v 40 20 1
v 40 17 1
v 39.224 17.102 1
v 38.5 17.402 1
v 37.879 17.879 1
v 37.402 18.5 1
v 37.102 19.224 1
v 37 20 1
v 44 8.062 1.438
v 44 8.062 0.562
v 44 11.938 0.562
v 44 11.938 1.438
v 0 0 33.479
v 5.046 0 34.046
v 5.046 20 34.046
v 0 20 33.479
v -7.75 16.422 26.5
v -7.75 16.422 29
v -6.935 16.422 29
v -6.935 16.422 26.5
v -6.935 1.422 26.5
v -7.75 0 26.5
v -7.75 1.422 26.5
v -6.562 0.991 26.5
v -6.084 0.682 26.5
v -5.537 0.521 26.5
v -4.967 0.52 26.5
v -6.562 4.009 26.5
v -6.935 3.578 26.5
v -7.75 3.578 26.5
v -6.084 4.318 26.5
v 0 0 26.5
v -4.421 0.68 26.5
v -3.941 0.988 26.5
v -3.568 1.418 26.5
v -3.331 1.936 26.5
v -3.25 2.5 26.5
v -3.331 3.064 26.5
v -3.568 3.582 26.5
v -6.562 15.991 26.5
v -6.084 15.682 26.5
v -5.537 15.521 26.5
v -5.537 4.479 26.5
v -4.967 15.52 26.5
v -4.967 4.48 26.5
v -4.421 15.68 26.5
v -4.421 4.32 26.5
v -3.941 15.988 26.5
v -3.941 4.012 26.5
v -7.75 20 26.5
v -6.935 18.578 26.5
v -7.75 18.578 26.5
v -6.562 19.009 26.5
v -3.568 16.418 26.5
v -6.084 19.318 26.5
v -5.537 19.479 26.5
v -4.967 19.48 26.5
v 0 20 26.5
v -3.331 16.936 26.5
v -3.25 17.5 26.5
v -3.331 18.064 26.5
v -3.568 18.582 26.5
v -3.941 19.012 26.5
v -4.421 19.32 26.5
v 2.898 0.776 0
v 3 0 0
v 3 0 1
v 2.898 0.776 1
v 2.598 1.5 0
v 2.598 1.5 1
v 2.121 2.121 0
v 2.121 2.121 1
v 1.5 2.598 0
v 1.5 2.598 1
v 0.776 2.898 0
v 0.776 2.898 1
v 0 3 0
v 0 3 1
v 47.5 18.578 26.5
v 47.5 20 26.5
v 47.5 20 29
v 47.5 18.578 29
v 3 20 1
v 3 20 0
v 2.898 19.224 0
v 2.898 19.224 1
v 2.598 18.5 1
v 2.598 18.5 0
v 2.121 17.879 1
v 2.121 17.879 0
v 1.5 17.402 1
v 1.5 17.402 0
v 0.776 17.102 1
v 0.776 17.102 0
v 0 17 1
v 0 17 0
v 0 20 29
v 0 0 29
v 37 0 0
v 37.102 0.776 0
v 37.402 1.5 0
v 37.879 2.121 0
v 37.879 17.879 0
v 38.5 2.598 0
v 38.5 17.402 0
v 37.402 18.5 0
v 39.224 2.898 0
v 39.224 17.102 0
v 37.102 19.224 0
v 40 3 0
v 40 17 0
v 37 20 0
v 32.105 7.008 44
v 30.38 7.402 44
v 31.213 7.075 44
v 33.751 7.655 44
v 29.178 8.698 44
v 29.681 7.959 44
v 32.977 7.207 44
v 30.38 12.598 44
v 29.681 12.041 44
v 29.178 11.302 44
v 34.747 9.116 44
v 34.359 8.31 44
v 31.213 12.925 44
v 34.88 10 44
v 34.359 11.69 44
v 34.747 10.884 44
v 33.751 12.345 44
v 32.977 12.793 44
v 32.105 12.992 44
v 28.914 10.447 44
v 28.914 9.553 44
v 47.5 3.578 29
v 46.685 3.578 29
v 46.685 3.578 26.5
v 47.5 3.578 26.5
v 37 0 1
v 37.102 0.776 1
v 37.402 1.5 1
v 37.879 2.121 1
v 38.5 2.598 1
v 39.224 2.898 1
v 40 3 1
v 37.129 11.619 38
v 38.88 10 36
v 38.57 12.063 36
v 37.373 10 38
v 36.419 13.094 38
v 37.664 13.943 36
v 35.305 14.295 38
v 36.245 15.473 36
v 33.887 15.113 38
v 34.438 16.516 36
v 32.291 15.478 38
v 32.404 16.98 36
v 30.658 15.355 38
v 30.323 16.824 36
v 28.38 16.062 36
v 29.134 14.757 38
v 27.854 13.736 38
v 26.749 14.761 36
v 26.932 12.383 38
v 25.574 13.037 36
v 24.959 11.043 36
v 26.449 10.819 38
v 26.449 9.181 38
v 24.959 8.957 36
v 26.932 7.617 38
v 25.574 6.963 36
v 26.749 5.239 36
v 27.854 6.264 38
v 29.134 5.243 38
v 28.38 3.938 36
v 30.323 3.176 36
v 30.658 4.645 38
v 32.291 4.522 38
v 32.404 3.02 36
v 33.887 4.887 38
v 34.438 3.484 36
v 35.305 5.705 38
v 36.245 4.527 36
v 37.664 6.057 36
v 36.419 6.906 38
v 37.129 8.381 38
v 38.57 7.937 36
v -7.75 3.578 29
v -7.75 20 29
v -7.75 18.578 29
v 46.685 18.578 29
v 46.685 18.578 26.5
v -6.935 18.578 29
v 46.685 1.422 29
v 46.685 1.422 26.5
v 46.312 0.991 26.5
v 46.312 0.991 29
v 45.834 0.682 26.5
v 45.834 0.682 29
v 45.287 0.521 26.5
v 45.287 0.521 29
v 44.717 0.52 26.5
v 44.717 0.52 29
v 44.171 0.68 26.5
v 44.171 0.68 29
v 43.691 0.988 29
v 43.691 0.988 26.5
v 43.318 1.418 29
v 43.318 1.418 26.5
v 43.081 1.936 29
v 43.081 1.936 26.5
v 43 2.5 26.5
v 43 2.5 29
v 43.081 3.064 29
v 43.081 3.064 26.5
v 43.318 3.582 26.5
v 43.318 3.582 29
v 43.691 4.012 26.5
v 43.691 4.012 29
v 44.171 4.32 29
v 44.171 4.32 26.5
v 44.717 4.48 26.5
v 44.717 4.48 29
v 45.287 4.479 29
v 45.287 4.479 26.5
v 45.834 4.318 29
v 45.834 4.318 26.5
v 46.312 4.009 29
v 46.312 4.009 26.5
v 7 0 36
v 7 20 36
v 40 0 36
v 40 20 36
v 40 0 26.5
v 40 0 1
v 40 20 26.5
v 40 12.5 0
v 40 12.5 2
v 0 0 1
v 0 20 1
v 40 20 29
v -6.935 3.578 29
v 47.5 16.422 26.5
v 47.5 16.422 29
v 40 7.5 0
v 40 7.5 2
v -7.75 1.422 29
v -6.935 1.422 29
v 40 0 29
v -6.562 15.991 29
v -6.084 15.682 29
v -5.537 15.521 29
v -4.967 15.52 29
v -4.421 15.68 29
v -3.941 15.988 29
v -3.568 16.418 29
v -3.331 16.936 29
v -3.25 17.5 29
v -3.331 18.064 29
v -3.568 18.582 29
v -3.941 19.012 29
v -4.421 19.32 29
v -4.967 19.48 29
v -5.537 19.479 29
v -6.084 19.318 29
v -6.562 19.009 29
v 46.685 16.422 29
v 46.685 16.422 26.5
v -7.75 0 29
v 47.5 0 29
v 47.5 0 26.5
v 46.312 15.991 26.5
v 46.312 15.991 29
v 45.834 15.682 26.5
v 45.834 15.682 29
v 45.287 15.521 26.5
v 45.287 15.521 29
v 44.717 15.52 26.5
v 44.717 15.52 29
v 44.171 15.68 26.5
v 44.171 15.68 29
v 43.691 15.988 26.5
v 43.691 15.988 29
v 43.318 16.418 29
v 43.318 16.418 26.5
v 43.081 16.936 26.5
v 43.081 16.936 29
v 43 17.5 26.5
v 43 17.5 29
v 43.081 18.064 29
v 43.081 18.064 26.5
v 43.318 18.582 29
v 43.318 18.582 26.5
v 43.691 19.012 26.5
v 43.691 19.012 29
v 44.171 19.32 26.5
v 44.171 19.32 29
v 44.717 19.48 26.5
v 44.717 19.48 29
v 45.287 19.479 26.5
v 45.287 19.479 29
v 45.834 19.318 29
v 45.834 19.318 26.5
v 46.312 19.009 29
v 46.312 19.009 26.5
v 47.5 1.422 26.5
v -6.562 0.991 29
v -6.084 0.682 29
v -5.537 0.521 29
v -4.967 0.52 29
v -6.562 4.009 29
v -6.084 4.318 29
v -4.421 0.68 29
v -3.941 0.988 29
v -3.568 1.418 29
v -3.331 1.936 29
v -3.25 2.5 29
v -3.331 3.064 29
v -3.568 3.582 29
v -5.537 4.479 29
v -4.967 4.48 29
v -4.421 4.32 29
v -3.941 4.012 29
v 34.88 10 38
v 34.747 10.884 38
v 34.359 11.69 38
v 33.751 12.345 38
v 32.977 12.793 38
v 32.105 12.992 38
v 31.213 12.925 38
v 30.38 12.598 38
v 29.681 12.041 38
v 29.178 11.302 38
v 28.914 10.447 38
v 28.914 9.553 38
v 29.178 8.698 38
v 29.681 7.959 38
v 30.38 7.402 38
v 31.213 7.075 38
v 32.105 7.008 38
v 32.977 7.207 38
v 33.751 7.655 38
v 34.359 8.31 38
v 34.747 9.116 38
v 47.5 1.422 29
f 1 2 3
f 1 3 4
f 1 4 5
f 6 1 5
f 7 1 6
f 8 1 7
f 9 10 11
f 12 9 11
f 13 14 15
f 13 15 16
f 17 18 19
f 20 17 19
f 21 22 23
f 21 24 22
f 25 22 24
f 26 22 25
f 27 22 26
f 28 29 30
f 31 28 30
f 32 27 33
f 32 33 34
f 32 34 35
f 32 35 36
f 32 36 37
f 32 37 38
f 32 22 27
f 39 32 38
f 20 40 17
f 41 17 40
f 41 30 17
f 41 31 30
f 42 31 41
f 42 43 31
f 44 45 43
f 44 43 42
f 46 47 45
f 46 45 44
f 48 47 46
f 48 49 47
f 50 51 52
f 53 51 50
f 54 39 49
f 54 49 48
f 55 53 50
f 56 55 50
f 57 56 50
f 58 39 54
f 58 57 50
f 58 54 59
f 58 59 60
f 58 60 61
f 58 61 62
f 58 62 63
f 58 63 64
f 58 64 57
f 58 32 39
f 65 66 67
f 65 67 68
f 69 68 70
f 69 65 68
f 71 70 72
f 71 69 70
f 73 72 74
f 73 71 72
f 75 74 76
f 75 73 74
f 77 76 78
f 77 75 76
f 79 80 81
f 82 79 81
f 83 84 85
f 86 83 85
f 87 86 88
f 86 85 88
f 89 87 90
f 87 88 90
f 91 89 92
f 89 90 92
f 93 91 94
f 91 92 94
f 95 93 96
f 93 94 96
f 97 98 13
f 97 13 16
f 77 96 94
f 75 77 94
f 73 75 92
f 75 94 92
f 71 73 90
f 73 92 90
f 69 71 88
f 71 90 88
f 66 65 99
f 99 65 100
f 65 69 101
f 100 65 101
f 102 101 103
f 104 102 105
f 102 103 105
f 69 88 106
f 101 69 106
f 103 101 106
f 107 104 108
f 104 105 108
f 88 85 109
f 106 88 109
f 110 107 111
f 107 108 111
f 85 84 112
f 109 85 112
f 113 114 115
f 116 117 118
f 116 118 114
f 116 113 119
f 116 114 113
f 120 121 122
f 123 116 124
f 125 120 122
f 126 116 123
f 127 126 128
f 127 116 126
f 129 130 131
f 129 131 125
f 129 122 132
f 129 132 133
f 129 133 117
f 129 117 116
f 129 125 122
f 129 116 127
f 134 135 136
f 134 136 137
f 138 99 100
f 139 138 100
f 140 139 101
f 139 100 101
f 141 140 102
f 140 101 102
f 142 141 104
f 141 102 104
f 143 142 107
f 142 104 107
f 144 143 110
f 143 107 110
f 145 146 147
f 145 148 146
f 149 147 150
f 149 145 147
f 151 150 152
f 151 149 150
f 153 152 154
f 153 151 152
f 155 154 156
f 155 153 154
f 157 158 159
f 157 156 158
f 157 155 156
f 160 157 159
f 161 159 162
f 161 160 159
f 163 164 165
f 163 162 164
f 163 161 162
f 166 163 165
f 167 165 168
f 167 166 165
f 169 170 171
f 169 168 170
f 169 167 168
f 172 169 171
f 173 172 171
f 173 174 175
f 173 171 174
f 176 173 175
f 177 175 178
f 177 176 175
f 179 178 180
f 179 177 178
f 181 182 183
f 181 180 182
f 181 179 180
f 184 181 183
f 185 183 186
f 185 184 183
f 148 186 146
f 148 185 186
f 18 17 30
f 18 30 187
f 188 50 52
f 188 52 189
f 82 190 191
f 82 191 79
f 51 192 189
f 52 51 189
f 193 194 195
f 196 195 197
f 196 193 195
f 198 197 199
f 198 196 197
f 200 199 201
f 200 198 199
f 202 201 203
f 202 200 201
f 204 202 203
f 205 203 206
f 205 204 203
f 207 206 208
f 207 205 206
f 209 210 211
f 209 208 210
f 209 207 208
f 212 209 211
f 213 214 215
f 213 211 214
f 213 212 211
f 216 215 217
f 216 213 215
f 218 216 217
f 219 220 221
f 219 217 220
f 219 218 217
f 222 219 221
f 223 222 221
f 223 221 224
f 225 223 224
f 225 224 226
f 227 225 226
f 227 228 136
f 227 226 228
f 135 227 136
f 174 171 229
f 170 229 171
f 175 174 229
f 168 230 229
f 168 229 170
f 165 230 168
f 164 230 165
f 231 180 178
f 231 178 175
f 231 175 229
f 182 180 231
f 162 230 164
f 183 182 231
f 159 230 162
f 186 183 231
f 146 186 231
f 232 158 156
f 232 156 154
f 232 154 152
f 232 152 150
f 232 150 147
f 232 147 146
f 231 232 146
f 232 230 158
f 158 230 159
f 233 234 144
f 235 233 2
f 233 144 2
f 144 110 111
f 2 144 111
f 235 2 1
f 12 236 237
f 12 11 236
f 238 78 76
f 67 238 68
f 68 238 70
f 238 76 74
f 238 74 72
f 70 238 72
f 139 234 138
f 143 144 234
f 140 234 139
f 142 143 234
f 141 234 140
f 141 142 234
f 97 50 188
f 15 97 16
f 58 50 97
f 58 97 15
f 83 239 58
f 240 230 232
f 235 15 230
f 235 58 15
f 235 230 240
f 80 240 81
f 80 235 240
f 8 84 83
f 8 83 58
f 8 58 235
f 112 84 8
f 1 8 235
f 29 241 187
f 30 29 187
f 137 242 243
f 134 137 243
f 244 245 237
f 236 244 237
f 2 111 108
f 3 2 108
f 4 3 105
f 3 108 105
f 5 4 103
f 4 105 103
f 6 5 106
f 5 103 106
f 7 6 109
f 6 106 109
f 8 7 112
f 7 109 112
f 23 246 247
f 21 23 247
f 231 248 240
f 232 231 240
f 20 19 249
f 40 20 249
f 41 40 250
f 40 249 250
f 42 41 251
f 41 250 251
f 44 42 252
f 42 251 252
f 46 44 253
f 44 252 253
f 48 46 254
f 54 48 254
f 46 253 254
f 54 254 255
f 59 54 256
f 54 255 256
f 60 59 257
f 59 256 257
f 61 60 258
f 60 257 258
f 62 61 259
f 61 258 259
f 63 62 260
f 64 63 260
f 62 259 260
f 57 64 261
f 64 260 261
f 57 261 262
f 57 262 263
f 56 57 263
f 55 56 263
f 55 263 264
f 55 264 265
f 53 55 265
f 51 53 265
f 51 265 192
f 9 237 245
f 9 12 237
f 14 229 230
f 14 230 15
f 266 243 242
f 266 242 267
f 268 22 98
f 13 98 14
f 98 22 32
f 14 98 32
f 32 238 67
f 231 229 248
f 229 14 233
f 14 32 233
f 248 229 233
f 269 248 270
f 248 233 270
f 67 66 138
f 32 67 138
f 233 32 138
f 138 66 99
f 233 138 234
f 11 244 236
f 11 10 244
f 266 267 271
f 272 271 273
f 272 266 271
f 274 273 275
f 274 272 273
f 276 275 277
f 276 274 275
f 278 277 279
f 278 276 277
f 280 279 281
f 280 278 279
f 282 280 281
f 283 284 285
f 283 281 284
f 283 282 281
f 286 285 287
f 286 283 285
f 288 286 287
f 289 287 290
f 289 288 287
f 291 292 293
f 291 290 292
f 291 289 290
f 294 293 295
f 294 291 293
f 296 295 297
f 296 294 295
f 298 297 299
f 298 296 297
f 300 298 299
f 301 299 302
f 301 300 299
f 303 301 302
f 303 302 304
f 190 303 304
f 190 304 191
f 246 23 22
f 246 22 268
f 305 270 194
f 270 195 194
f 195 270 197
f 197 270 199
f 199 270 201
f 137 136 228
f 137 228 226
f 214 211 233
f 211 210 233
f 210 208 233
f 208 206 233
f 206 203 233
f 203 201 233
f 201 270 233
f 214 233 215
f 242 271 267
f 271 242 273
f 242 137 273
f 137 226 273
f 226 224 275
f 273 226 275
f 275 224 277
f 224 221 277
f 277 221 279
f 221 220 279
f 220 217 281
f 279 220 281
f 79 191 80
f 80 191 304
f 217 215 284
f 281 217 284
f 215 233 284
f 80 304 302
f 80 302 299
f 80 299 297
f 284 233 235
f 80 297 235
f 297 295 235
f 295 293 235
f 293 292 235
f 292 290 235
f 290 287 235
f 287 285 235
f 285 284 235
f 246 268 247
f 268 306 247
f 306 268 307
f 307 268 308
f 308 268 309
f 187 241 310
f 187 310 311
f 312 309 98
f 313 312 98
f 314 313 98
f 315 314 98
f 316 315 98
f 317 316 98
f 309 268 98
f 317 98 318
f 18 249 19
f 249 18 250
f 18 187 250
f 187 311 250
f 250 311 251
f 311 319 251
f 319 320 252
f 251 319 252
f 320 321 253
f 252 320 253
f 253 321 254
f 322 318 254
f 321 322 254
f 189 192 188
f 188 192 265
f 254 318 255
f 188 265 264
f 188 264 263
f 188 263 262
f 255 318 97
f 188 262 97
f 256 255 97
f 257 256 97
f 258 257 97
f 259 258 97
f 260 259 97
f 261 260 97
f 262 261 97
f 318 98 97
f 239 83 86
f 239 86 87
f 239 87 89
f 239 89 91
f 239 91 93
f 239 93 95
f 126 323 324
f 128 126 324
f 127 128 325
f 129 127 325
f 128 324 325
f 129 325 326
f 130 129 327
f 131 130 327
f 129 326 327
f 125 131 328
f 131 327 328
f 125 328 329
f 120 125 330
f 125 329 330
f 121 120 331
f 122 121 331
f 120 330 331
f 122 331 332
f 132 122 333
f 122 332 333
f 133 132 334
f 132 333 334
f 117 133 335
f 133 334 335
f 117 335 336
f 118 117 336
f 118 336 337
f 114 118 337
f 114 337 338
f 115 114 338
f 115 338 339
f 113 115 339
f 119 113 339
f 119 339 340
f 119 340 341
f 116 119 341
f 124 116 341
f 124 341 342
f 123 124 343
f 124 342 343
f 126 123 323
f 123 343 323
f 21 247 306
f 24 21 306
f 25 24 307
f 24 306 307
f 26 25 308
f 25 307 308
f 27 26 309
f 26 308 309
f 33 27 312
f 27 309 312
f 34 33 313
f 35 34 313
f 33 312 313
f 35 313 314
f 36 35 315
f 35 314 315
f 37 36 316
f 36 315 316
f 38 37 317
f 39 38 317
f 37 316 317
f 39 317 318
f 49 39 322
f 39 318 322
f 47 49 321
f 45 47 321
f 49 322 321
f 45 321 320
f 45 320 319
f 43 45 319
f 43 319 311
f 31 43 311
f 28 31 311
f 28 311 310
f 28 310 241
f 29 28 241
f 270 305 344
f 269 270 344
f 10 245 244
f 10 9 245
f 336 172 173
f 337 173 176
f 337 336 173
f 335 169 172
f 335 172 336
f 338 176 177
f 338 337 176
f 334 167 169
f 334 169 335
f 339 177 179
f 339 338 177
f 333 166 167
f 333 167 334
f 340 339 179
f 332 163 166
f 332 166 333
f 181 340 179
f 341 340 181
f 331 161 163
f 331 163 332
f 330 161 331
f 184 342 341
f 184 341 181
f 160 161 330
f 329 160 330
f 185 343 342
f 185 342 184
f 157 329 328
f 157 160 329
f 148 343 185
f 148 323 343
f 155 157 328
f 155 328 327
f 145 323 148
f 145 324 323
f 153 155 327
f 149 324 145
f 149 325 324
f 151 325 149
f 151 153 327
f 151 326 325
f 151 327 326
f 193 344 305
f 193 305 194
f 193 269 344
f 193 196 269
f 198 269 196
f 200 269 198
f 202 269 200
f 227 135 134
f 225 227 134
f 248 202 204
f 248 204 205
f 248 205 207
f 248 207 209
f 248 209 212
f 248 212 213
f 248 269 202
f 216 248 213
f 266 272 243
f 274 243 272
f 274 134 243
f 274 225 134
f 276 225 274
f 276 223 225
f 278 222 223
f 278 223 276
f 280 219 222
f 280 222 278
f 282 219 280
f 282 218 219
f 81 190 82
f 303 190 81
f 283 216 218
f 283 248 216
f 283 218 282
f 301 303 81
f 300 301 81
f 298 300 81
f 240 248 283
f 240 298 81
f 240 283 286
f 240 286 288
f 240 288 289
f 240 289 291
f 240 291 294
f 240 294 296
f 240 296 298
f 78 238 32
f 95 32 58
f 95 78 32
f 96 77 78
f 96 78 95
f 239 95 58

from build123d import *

# Parameters (mm, degrees)
SKETCH2_W           = 40
SKETCH2_H           = 20
EXTRUDE1_DEPTH      = 36
SKETCH3_W           = 2.5
SKETCH3_H           = 20
EXTRUDE2_DEPTH      = 7.75
EXTRUDE2_DEPTH_BACK = 47.5
EXTRUDE3_DEPTH      = 1
SKETCH5_W           = 2
SKETCH5_H           = 5
EXTRUDE4_DEPTH      = 4
EXTRUDE4_TAPER      = 8
EXTRUDE7_DEPTH      = 24
EXTRUDE7_DEPTH_BACK = 12
SKETCH8_R           = 7
EXTRUDE8_DEPTH      = 2
EXTRUDE8_TAPER      = 37
EXTRUDE9_DEPTH      = 15
EXTRUDE9_DEPTH_BACK = 24
SKETCH10_R          = 3
EXTRUDE10_DEPTH     = 6


with BuildPart() as part:
    # Sketch2 → Extrude1 (new body)
    with BuildSketch(Plane.XY):
        with Locations((20, 10)):
            Rectangle(SKETCH2_W, SKETCH2_H)
    extrude(amount=EXTRUDE1_DEPTH)

    # Sketch3 → Extrude2 (add, two sides)
    with BuildSketch(Plane.ZY) as extrude2_sk:
        with Locations((27.75, 10)):
            Rectangle(SKETCH3_W, SKETCH3_H)
    extrude(amount=EXTRUDE2_DEPTH)
    extrude(extrude2_sk.sketch, amount=-EXTRUDE2_DEPTH_BACK)

    # Sketch4 → Extrude3 (cut)
    with BuildSketch(Plane(origin=(0, 0, 0), x_dir=(-1, 0, 0), z_dir=(0, 0, -1))):
        with BuildLine():
            Line((-37, 20), (-40, 20))
            Line((-40, 20), (-40, 17))
            ThreePointArc((-40, 17), (-37.878679656, 17.878679656), (-37, 20))
        make_face()
        with BuildLine():
            Line((-40, 3), (-40, 0))
            Line((-40, 0), (-37, 0))
            ThreePointArc((-37, 0), (-37.878679656, 2.121320344), (-40, 3))
        make_face()
        with BuildLine():
            Line((0, 3), (0, 0))
            Line((0, 0), (-3, 0))
            ThreePointArc((-3, 0), (-2.121320344, 2.121320344), (0, 3))
        make_face()
        with BuildLine():
            Line((0, 17), (0, 20))
            Line((0, 20), (-3, 20))
            ThreePointArc((-3, 20), (-2.121320344, 17.878679656), (0, 17))
        make_face()
    extrude(amount=-EXTRUDE3_DEPTH, mode=Mode.SUBTRACT)

    # Sketch6 → Extrude7 (cut, two sides)
    with BuildSketch(Plane.XY.offset(29)) as extrude7_sk:
        with BuildLine():
            Line((-6.93456787, 3.578068222), (-7.75, 3.578068222))
            Line((-7.75, 3.578068222), (-7.75, 1.421931778))
            Line((-7.75, 1.421931778), (-6.93456787, 1.421931778))
            ThreePointArc((-6.93456787, 1.421931778), (-3.25, 2.5), (-6.93456787, 3.578068222))
        make_face()
        with BuildLine():
            Line((46.68456787, 18.578068222), (47.5, 18.578068222))
            Line((47.5, 18.578068222), (47.5, 16.421931778))
            Line((47.5, 16.421931778), (46.68456787, 16.421931778))
            ThreePointArc((46.68456787, 16.421931778), (43, 17.5), (46.68456787, 18.578068222))
        make_face()
        with BuildLine():
            ThreePointArc((46.68456787, 1.421931778), (43, 2.5), (46.68456787, 3.578068222))
            Line((46.68456787, 3.578068222), (47.5, 3.578068222))
            Line((47.5, 3.578068222), (47.5, 1.421931778))
            Line((47.5, 1.421931778), (46.68456787, 1.421931778))
        make_face()
        with BuildLine():
            ThreePointArc((-6.93456787, 16.421931778), (-3.25, 17.5), (-6.93456787, 18.578068222))
            Line((-6.93456787, 18.578068222), (-7.75, 18.578068222))
            Line((-7.75, 18.578068222), (-7.75, 16.421931778))
            Line((-7.75, 16.421931778), (-6.93456787, 16.421931778))
        make_face()
    extrude(amount=EXTRUDE7_DEPTH, mode=Mode.SUBTRACT)
    extrude(extrude7_sk.sketch, amount=-EXTRUDE7_DEPTH_BACK, mode=Mode.SUBTRACT)

    # Sketch8 → Extrude8 (add)
    with BuildSketch(Plane.XY.offset(36)):
        with Locations((31.880492546, 10)):
            Circle(SKETCH8_R)
    extrude(amount=EXTRUDE8_DEPTH, taper=EXTRUDE8_TAPER)

    # Sketch9 → Extrude9 (cut, two sides)
    with BuildSketch(Plane.XZ) as extrude9_sk:
        Polygon((7, 36), (5.046113412, 34.046113412), (0, 33.479218226), (0, 34.046113412), (0, 36), align=None)
    extrude(amount=EXTRUDE9_DEPTH, mode=Mode.SUBTRACT)
    extrude(extrude9_sk.sketch, amount=-EXTRUDE9_DEPTH_BACK, mode=Mode.SUBTRACT)

    # Sketch10 → Extrude10 (add)
    with BuildSketch(Plane.XY.offset(38)):
        with Locations((31.880492546, 10)):
            Circle(SKETCH10_R)
    extrude(amount=EXTRUDE10_DEPTH)


with BuildPart() as body_2:
    # Sketch5 → Extrude4 (new body)
    with BuildSketch(Plane(origin=(40, 0, 0), x_dir=(0, 0, -1), z_dir=(1, 0, 0))):
        with Locations((-1, 10)):
            Rectangle(SKETCH5_W, SKETCH5_H)
    extrude(amount=EXTRUDE4_DEPTH, taper=EXTRUDE4_TAPER)


solid = Compound([part.part, body_2.part])
